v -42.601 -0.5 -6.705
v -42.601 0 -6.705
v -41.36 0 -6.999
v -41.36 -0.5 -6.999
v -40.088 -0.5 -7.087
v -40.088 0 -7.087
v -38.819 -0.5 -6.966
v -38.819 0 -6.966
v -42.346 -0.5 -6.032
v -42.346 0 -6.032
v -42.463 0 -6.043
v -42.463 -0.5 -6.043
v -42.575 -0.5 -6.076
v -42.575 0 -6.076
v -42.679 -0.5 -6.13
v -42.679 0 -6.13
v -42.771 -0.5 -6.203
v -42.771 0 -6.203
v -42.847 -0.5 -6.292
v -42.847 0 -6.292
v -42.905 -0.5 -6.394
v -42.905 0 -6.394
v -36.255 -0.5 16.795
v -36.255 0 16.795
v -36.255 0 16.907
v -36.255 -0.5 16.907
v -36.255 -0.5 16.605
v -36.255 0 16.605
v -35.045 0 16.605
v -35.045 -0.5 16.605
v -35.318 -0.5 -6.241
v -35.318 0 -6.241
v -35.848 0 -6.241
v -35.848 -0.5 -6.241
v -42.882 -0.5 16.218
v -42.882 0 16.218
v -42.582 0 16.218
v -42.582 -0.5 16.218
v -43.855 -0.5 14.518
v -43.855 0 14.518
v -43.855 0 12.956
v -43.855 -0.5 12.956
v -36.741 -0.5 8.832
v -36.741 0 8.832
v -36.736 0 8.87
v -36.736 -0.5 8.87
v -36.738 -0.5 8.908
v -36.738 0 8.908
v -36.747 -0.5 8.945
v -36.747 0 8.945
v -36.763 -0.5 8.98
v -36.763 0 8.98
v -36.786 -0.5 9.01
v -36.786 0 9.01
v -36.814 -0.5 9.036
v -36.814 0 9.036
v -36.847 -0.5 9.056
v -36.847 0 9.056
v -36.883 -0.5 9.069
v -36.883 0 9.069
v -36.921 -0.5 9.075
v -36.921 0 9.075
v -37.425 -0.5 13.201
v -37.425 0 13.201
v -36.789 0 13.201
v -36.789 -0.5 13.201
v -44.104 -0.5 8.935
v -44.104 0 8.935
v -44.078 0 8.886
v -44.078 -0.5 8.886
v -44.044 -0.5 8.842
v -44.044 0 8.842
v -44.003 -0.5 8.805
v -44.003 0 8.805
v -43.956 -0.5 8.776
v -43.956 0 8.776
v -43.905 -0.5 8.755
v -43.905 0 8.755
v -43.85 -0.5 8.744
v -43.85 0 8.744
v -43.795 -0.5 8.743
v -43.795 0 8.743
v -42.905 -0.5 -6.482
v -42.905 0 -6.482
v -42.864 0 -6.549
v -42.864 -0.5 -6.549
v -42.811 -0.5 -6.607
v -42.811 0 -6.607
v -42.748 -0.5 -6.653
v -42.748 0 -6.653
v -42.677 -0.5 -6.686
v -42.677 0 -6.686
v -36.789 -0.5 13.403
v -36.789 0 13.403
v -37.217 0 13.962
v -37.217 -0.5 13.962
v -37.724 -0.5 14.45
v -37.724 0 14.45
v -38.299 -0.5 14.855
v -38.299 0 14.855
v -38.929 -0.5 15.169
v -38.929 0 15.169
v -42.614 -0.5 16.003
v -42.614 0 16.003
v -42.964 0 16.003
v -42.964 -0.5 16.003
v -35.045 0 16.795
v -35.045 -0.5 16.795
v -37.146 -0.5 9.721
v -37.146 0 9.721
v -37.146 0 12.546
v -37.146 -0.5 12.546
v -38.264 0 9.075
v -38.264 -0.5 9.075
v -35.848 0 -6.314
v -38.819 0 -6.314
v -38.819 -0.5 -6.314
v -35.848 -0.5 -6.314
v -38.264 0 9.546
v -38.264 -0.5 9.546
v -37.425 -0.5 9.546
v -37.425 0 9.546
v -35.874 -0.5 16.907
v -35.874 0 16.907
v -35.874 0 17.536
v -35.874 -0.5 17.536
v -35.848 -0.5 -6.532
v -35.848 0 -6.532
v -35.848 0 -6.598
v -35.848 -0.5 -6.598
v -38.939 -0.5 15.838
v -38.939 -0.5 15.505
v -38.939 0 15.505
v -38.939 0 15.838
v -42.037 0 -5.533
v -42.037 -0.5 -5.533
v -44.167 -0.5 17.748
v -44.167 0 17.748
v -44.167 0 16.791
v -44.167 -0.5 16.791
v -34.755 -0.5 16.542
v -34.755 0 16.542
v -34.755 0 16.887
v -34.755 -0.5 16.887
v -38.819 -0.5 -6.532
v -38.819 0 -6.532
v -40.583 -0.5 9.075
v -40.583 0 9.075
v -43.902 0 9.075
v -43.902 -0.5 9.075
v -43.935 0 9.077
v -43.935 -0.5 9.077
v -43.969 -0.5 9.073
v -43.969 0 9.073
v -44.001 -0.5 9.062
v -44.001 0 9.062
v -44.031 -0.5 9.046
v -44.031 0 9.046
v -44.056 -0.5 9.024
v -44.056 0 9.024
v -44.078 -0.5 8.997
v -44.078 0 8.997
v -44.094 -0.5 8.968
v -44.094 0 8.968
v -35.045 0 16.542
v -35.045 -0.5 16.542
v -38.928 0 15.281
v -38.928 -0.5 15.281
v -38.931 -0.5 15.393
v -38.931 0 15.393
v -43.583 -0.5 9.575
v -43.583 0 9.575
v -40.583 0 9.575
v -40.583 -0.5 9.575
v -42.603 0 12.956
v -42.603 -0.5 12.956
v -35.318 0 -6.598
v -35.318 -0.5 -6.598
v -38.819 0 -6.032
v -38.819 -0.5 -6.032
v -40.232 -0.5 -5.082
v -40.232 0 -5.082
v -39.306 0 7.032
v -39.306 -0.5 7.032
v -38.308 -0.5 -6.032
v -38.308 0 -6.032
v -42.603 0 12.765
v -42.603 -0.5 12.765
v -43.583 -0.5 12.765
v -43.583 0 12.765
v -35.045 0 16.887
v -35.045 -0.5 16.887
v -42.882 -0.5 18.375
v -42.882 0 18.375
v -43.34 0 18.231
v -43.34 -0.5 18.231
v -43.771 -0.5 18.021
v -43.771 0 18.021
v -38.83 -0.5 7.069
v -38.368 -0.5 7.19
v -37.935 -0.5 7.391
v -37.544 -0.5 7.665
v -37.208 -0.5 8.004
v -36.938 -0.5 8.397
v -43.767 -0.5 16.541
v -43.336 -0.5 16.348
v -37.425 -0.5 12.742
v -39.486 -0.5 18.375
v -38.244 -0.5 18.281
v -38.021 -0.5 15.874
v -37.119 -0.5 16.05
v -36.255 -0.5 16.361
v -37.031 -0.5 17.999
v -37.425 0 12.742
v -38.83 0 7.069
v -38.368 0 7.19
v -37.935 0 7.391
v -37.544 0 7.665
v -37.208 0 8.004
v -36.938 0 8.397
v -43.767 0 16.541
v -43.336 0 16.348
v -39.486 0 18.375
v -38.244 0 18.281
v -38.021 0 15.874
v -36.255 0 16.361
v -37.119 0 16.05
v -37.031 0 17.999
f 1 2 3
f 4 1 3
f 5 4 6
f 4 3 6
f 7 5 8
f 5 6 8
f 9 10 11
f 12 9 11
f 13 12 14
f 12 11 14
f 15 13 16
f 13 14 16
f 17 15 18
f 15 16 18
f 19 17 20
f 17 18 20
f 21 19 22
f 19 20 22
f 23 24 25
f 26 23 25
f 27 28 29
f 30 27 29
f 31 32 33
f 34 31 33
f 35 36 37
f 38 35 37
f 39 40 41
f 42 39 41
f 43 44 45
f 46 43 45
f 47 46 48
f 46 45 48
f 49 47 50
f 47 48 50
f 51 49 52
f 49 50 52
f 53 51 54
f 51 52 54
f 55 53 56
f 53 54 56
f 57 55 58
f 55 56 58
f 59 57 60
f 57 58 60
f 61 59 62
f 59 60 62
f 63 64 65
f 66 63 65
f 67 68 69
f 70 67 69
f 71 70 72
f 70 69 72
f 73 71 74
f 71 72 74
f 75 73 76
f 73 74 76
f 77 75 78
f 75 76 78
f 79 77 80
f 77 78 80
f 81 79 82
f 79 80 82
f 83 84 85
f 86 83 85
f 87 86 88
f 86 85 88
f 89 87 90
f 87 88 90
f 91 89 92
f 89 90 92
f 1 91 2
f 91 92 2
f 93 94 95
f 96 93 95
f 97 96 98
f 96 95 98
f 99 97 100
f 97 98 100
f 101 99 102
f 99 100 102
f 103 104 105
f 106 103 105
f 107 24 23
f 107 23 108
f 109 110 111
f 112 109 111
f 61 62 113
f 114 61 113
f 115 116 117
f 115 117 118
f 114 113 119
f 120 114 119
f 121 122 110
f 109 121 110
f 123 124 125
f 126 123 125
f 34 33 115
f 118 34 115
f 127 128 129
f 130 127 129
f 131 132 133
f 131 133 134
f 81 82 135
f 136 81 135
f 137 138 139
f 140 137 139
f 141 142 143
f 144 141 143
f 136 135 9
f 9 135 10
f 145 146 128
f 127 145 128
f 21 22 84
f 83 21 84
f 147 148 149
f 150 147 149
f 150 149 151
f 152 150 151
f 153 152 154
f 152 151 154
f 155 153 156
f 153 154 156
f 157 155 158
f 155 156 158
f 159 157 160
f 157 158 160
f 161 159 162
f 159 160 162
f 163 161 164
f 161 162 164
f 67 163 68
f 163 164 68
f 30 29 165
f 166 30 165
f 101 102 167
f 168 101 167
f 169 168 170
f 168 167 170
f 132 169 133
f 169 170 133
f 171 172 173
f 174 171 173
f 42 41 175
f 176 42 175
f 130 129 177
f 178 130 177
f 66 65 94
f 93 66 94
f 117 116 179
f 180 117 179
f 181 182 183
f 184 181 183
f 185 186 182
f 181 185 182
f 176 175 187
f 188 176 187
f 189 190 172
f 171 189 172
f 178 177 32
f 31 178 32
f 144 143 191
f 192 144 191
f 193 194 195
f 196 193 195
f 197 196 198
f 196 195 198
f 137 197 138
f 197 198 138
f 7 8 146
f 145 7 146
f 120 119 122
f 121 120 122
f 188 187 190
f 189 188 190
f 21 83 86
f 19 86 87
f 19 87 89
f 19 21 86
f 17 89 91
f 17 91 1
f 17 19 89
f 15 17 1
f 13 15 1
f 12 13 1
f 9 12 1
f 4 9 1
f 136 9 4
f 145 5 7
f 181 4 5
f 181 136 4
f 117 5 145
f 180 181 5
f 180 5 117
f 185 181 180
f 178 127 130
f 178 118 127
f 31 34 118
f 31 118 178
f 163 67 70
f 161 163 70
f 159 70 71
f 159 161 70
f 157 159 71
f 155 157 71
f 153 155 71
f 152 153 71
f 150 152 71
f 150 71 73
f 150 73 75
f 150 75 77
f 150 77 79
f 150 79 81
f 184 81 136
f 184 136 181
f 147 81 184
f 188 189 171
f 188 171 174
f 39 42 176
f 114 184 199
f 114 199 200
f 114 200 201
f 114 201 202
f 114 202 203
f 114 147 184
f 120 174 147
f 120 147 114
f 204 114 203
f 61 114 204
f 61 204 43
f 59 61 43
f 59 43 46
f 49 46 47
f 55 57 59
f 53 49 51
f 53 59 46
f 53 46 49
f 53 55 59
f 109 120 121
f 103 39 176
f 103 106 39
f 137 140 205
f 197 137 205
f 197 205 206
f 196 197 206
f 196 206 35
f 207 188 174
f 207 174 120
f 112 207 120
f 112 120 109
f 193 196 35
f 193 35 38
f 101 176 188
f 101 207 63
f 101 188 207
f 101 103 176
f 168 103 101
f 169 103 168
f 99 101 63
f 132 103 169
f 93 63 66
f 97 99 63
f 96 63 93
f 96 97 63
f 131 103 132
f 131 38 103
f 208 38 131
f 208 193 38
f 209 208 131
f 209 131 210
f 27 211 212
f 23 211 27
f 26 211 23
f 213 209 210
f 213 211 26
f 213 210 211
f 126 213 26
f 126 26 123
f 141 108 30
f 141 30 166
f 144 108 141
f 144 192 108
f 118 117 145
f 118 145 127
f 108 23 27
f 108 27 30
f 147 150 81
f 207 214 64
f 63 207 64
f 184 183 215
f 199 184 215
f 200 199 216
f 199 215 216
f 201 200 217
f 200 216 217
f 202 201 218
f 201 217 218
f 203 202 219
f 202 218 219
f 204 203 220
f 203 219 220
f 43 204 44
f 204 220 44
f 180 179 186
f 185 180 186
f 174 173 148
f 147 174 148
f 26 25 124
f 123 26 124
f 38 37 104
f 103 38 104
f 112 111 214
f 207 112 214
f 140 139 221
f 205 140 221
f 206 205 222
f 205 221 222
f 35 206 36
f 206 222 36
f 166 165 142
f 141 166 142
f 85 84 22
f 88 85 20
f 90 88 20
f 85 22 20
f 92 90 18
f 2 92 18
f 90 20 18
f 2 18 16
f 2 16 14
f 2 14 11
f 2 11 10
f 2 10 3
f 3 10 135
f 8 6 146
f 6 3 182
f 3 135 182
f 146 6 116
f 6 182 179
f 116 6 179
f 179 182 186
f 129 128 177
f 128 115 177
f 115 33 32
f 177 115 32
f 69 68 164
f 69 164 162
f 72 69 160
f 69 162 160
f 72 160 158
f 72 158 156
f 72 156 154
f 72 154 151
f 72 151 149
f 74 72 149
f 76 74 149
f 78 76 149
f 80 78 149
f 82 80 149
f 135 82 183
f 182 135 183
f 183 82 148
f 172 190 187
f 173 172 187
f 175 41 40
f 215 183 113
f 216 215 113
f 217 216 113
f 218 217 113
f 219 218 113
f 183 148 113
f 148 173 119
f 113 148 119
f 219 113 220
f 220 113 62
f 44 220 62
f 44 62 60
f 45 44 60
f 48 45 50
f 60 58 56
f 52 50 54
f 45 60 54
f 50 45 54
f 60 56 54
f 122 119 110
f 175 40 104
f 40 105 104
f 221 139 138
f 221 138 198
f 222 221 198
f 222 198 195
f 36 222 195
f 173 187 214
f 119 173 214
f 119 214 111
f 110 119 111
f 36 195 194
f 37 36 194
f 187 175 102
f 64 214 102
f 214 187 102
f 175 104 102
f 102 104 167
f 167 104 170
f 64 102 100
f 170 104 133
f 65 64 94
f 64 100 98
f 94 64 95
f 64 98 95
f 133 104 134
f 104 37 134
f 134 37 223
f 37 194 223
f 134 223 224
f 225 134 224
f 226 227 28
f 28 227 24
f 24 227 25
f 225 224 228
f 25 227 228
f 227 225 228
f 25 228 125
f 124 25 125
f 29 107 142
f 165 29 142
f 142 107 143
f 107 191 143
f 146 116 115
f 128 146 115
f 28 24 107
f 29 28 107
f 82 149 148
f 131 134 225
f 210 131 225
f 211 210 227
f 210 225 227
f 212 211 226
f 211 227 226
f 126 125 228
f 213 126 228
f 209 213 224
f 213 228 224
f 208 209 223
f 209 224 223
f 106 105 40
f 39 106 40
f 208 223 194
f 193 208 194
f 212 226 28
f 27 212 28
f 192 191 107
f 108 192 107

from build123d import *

# Parameters (mm, degrees)
F0_W     = 2.97095
F0_H     = 0.218032
F0_W_2   = 1.209654
F0_H_2   = 0.189883
F1_DEPTH = 0.5


with BuildPart() as f1:
    # F0 (on Front) → F1 (new body)
    with BuildSketch(Plane.XZ):
        with BuildLine():
            ThreePointArc((-44.103578, 8.935158), (-43.980027, 8.789603), (-43.794962, 8.742675))
            Line((-43.794962, 8.742675), (-42.037207, -5.533148))
            Line((-42.037207, -5.533148), (-42.346001, -6.031972))
            ThreePointArc((-42.346001, -6.031972), (-42.678832, -6.130309), (-42.904774, -6.39374))
            Line((-42.904774, -6.39374), (-42.904774, -6.481908))
            ThreePointArc((-42.904774, -6.481908), (-42.780729, -6.63127), (-42.601286, -6.705408))
            ThreePointArc((-42.601286, -6.705408), (-40.726024, -7.06924), (-38.818597, -6.965784))
            Line((-38.818597, -6.965784), (-38.818597, -6.532135))
            Line((-38.818597, -6.532135), (-38.818597, -6.314103))
            Line((-38.818597, -6.314103), (-38.818597, -6.031972))
            Line((-38.818597, -6.031972), (-38.307915, -6.031972))
            Line((-38.307915, -6.031972), (-40.231944, -5.081834))
            Line((-40.231944, -5.081834), (-39.30556, 7.032427))
            ThreePointArc((-39.30556, 7.032427), (-37.733332, 7.518913), (-36.741034, 8.831892))
            ThreePointArc((-36.741034, 8.831892), (-36.774021, 8.995548), (-36.920728, 9.075224))
            Line((-36.920728, 9.075224), (-38.264113, 9.075224))
            Line((-38.264113, 9.075224), (-38.264113, 9.545864))
            Line((-38.264113, 9.545864), (-37.425197, 9.545864))
            Line((-37.425197, 9.545864), (-37.145558, 9.720638))
            Line((-37.145558, 9.720638), (-37.145558, 12.546355))
            Line((-37.145558, 12.546355), (-37.425197, 12.74232))
            Line((-37.425197, 12.74232), (-37.425197, 13.201373))
            Line((-37.425197, 13.201373), (-36.788988, 13.201373))
            Line((-36.788988, 13.201373), (-36.788988, 13.403278))
            ThreePointArc((-36.788988, 13.403278), (-37.723861, 14.44951), (-38.928528, 15.168793))
            ThreePointArc((-38.928528, 15.168793), (-38.9336, 15.170855), (-38.938675, 15.17291))
            Line((-38.938675, 15.17291), (-38.938675, 15.505459))
            Line((-38.938675, 15.505459), (-38.938675, 15.838007))
            ThreePointArc((-38.938675, 15.838007), (-37.566496, 15.944642), (-36.254536, 16.360583))
            Line((-36.254536, 16.360583), (-36.254536, 16.604704))
            Line((-36.254536, 16.604704), (-36.254536, 16.794587))
            Line((-36.254536, 16.794587), (-36.254536, 16.906913))
            Line((-36.254536, 16.906913), (-35.874481, 16.906913))
            Line((-35.874481, 16.906913), (-35.874481, 17.536379))
            ThreePointArc((-35.874481, 17.536379), (-37.632307, 18.162802), (-39.486278, 18.375282))
            Line((-39.486278, 18.375282), (-41.803283, 18.375282))
            Line((-41.803283, 18.375282), (-42.881891, 18.375282))
            ThreePointArc((-42.881891, 18.375282), (-43.559562, 18.134035), (-44.166764, 17.74836))
            Line((-44.166764, 17.74836), (-44.166764, 16.790975))
            ThreePointArc((-44.166764, 16.790975), (-43.554395, 16.437088), (-42.881891, 16.21807))
            Line((-42.881891, 16.21807), (-42.582278, 16.21807))
            Line((-42.582278, 16.21807), (-42.613738, 16.00273))
            Line((-42.613738, 16.00273), (-42.964101, 16.00273))
            Line((-42.964101, 16.00273), (-43.854554, 14.518307))
            Line((-43.854554, 14.518307), (-43.854554, 12.956257))
            Line((-43.854554, 12.956257), (-42.603236, 12.956257))
            Line((-42.603236, 12.956257), (-42.603236, 12.76462))
            Line((-42.603236, 12.76462), (-43.582644, 12.76462))
            Line((-43.582644, 12.76462), (-43.582644, 9.575224))
            Line((-43.582644, 9.575224), (-40.582644, 9.575224))
            Line((-40.582644, 9.575224), (-40.582644, 9.075224))
            Line((-40.582644, 9.075224), (-43.264113, 9.075224))
            Line((-43.264113, 9.075224), (-43.901596, 9.075224))
            ThreePointArc((-43.901596, 9.075224), (-44.030593, 9.045576), (-44.103578, 8.935158))
        make_face()
        with Locations((-37.333122, -6.423119)):
            Rectangle(F0_W, F0_H)
        Polygon((-35.847647, -6.314103), (-35.847647, -6.532135), (-35.847647, -6.597614), (-35.317635, -6.597614), (-35.317635, -6.240905), (-35.847647, -6.240905), align=None)
        with BuildLine():
            ThreePointArc((-38.938675, 15.17291), (-38.9336, 15.170855), (-38.928528, 15.168793))
            ThreePointArc((-38.928528, 15.168793), (-38.929196, 15.337259), (-38.938675, 15.505459))
            Line((-38.938675, 15.505459), (-38.938675, 15.17291))
        make_face()
        with Locations((-35.649709, 16.699645)):
            Rectangle(F0_W_2, F0_H_2)
        Polygon((-35.044882, 16.887183), (-35.044882, 16.794587), (-35.044882, 16.604704), (-35.044882, 16.541855), (-34.755295, 16.541855), (-34.755295, 16.887183), align=None)
    extrude(amount=F1_DEPTH)


solid = f1.part
